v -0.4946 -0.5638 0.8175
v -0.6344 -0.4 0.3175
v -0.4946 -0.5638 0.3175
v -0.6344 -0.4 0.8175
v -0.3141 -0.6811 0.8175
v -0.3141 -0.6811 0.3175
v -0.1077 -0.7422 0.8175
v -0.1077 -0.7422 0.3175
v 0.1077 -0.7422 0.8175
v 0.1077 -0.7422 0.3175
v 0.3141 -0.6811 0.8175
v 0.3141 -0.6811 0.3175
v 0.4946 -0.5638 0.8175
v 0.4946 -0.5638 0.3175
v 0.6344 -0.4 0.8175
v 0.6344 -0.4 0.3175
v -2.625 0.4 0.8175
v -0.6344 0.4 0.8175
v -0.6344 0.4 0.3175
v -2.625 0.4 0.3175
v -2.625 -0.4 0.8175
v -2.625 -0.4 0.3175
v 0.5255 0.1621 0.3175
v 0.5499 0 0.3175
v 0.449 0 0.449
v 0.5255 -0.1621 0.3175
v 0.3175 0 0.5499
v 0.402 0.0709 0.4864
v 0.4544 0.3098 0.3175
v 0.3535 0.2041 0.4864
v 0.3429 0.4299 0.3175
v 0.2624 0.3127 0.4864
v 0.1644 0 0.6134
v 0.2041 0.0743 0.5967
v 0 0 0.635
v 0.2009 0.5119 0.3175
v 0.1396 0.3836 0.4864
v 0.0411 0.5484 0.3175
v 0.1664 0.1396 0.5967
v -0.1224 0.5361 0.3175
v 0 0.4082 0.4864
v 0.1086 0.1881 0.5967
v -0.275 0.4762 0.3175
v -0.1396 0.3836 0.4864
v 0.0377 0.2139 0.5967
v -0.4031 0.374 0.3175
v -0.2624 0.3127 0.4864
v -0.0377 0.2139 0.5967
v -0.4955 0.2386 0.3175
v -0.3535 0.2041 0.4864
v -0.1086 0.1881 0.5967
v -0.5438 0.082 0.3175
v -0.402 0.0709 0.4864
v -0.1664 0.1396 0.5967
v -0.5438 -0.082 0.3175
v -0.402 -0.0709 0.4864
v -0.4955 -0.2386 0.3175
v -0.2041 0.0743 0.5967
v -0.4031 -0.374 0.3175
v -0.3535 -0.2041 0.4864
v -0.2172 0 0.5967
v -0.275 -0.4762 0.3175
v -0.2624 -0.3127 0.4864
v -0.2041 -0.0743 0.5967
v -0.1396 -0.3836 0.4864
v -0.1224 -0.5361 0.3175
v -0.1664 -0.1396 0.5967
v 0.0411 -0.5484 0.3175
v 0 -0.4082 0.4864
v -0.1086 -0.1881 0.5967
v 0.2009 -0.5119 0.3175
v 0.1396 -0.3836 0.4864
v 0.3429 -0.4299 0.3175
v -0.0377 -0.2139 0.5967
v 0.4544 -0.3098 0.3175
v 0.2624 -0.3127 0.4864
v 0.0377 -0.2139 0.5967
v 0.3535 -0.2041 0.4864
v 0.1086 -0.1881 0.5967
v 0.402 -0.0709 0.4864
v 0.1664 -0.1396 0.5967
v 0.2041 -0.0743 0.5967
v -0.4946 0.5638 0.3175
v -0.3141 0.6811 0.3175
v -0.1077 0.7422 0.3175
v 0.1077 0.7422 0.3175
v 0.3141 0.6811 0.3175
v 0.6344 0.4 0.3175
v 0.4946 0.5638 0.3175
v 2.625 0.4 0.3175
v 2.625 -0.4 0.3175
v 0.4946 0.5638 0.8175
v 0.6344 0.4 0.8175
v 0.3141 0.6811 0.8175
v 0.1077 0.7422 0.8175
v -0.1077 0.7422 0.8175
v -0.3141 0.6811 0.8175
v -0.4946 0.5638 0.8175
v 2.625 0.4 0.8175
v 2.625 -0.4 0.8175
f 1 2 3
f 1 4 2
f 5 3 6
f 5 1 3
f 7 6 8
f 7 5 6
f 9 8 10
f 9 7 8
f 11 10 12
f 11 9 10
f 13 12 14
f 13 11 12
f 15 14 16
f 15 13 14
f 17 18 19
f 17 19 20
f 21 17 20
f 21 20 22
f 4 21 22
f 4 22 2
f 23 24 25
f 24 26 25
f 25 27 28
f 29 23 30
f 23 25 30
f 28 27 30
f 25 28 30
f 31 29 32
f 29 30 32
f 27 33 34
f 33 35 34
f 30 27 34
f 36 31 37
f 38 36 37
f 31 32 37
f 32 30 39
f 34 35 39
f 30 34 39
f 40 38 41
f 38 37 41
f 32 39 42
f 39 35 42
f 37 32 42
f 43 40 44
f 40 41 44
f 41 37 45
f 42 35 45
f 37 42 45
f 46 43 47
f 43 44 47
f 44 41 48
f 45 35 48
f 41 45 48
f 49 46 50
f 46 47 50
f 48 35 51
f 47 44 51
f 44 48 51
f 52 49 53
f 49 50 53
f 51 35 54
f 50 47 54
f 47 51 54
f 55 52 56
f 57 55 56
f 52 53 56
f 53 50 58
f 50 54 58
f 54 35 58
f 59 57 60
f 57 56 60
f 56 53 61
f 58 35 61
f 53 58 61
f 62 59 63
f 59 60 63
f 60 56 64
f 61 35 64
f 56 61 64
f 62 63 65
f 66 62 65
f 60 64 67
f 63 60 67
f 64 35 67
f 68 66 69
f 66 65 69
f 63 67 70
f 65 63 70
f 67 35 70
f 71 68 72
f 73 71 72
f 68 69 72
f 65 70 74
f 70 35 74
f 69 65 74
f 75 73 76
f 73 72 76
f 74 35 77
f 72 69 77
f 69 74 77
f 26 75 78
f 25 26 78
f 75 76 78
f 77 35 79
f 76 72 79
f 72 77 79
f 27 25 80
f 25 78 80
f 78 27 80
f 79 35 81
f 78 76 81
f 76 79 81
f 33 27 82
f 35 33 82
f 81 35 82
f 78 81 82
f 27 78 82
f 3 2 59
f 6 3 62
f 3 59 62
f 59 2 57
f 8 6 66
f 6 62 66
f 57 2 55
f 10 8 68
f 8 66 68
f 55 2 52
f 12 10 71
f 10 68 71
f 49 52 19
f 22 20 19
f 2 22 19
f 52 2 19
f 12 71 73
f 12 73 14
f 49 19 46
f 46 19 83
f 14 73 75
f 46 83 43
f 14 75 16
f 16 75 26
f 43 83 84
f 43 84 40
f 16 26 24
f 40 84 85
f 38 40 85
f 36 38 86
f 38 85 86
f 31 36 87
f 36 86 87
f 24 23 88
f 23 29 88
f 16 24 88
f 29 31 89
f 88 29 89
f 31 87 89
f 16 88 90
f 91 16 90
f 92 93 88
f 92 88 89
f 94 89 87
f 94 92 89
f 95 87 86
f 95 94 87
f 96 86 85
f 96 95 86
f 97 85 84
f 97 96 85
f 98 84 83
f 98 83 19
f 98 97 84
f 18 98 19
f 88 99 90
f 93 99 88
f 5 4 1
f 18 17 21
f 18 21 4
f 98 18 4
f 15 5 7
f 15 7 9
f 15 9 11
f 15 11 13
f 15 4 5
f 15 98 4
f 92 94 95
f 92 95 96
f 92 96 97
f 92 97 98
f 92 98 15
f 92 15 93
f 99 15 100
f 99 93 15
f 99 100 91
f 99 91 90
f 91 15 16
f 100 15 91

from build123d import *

# Parameters (mm, degrees)
PAD_DEPTH       = 0.25
SKETCH001_R     = 0.75
PAD001_DEPTH    = 0.25
SKETCH002_R     = 0.75
PAD002_DEPTH    = 0.25
SKETCH003_R     = 0.75
PAD003_DEPTH    = 0.25
SKETCH004_R     = 0.75
PAD004_DEPTH    = 0.4
SKETCH005_W     = 20
SKETCH005_H     = 20
POCKET_DEPTH    = 4.921606
SKETCH006_W     = 20
SKETCH006_H     = 20
POCKET001_DEPTH = 7.376


with BuildPart() as part:
    # Sketch (on DatumPlane) → Pad (new body, symmetric)
    with BuildSketch(Plane.XY.offset(0.5675)):
        Polygon((-7.195606, 5), (-7.195606, 0), (-7.195606, -5), (-6.795606, -5), (-6.395606, -5), (-6.395606, -0.4), (10, -0.4), (10, 0.4), (-6.395606, 0.4), (-6.395606, 5), (-6.795606, 5), align=None)
    extrude(amount=PAD_DEPTH, both=True)

    # Sketch001 (on DatumPlane) → Pad001 (join, symmetric)
    with BuildSketch(Plane.XY.offset(0.5675)):
        Circle(SKETCH001_R)
    extrude(amount=PAD001_DEPTH, both=True)

    # Sketch002 (on DatumPlane) → Pad002 (join, symmetric)
    with BuildSketch(Plane.XY.offset(0.5675)):
        with Locations((-6.795606, 5)):
            Circle(SKETCH002_R)
    extrude(amount=PAD002_DEPTH, both=True)

    # Sketch003 (on DatumPlane) → Pad003 (join, symmetric)
    with BuildSketch(Plane.XY.offset(0.5675)):
        with Locations((-6.795606, -5)):
            Circle(SKETCH003_R)
    extrude(amount=PAD003_DEPTH, both=True)

    # Sphere → Sphere (revolve, cut)
    with BuildSketch(Plane.XZ):
        with BuildLine():
            ThreePointArc((0, -0.635), (0.635, 0), (0, 0.635))
            Line((0, 0.635), (0, -0.635))
        make_face()
    revolve(axis=Axis((0, 0, 0), (0, 0, 1)), mode=Mode.SUBTRACT)

    # Sphere001 → Sphere001 (revolve, cut)
    with BuildSketch(Plane(origin=(-6.795606, 5, 1.135), x_dir=(1, 0, 0), z_dir=(0, -1, 0))):
        with BuildLine():
            ThreePointArc((0, -0.635), (0.635, 0), (0, 0.635))
            Line((0, 0.635), (0, -0.635))
        make_face()
    revolve(axis=Axis((-6.795606, 5, 1.135), (0, 0, 1)), mode=Mode.SUBTRACT)

    # Sphere002 → Sphere002 (revolve, cut)
    with BuildSketch(Plane(origin=(-6.795606, -5, 1.135), x_dir=(1, 0, 0), z_dir=(0, -1, 0))):
        with BuildLine():
            ThreePointArc((0, -0.635), (0.635, 0), (0, 0.635))
            Line((0, 0.635), (0, -0.635))
        make_face()
    revolve(axis=Axis((-6.795606, -5, 1.135), (0, 0, 1)), mode=Mode.SUBTRACT)

    # Sketch004 (on DatumPlane) → Pad004 (join, symmetric)
    with BuildSketch(Plane(origin=(0, 0, 0.5675), x_dir=(1, 0, 0), z_dir=(0, -1, 0))):
        with Locations((6.8, 0)):
            Circle(SKETCH004_R)
    extrude(amount=PAD004_DEPTH, both=True)

    # Sphere003 → Sphere003 (revolve, cut)
    with BuildSketch(Plane(origin=(6.8, 0.7175, 0.5675), x_dir=(1, 0, 0), z_dir=(0, -1, 0))):
        with BuildLine():
            ThreePointArc((0, -0.635), (0.635, 0), (0, 0.635))
            Line((0, 0.635), (0, -0.635))
        make_face()
    revolve(axis=Axis((6.8, 0.7175, 0.5675), (0, 0, 1)), mode=Mode.SUBTRACT)

    # Sketch005 (on DatumPlane) → Pocket (cut, through all)
    with BuildSketch(Plane(origin=(-2.625, 0, 0), x_dir=(0, -1, 0), z_dir=(-1, 0, 0))):
        Rectangle(SKETCH005_W, SKETCH005_H)
    extrude(amount=POCKET_DEPTH, mode=Mode.SUBTRACT)

    # Sketch006 (on DatumPlane) → Pocket001 (cut, through all)
    with BuildSketch(Plane.YZ.offset(2.625)):
        Rectangle(SKETCH006_W, SKETCH006_H)
    extrude(amount=POCKET001_DEPTH, mode=Mode.SUBTRACT)


solid = part.part
